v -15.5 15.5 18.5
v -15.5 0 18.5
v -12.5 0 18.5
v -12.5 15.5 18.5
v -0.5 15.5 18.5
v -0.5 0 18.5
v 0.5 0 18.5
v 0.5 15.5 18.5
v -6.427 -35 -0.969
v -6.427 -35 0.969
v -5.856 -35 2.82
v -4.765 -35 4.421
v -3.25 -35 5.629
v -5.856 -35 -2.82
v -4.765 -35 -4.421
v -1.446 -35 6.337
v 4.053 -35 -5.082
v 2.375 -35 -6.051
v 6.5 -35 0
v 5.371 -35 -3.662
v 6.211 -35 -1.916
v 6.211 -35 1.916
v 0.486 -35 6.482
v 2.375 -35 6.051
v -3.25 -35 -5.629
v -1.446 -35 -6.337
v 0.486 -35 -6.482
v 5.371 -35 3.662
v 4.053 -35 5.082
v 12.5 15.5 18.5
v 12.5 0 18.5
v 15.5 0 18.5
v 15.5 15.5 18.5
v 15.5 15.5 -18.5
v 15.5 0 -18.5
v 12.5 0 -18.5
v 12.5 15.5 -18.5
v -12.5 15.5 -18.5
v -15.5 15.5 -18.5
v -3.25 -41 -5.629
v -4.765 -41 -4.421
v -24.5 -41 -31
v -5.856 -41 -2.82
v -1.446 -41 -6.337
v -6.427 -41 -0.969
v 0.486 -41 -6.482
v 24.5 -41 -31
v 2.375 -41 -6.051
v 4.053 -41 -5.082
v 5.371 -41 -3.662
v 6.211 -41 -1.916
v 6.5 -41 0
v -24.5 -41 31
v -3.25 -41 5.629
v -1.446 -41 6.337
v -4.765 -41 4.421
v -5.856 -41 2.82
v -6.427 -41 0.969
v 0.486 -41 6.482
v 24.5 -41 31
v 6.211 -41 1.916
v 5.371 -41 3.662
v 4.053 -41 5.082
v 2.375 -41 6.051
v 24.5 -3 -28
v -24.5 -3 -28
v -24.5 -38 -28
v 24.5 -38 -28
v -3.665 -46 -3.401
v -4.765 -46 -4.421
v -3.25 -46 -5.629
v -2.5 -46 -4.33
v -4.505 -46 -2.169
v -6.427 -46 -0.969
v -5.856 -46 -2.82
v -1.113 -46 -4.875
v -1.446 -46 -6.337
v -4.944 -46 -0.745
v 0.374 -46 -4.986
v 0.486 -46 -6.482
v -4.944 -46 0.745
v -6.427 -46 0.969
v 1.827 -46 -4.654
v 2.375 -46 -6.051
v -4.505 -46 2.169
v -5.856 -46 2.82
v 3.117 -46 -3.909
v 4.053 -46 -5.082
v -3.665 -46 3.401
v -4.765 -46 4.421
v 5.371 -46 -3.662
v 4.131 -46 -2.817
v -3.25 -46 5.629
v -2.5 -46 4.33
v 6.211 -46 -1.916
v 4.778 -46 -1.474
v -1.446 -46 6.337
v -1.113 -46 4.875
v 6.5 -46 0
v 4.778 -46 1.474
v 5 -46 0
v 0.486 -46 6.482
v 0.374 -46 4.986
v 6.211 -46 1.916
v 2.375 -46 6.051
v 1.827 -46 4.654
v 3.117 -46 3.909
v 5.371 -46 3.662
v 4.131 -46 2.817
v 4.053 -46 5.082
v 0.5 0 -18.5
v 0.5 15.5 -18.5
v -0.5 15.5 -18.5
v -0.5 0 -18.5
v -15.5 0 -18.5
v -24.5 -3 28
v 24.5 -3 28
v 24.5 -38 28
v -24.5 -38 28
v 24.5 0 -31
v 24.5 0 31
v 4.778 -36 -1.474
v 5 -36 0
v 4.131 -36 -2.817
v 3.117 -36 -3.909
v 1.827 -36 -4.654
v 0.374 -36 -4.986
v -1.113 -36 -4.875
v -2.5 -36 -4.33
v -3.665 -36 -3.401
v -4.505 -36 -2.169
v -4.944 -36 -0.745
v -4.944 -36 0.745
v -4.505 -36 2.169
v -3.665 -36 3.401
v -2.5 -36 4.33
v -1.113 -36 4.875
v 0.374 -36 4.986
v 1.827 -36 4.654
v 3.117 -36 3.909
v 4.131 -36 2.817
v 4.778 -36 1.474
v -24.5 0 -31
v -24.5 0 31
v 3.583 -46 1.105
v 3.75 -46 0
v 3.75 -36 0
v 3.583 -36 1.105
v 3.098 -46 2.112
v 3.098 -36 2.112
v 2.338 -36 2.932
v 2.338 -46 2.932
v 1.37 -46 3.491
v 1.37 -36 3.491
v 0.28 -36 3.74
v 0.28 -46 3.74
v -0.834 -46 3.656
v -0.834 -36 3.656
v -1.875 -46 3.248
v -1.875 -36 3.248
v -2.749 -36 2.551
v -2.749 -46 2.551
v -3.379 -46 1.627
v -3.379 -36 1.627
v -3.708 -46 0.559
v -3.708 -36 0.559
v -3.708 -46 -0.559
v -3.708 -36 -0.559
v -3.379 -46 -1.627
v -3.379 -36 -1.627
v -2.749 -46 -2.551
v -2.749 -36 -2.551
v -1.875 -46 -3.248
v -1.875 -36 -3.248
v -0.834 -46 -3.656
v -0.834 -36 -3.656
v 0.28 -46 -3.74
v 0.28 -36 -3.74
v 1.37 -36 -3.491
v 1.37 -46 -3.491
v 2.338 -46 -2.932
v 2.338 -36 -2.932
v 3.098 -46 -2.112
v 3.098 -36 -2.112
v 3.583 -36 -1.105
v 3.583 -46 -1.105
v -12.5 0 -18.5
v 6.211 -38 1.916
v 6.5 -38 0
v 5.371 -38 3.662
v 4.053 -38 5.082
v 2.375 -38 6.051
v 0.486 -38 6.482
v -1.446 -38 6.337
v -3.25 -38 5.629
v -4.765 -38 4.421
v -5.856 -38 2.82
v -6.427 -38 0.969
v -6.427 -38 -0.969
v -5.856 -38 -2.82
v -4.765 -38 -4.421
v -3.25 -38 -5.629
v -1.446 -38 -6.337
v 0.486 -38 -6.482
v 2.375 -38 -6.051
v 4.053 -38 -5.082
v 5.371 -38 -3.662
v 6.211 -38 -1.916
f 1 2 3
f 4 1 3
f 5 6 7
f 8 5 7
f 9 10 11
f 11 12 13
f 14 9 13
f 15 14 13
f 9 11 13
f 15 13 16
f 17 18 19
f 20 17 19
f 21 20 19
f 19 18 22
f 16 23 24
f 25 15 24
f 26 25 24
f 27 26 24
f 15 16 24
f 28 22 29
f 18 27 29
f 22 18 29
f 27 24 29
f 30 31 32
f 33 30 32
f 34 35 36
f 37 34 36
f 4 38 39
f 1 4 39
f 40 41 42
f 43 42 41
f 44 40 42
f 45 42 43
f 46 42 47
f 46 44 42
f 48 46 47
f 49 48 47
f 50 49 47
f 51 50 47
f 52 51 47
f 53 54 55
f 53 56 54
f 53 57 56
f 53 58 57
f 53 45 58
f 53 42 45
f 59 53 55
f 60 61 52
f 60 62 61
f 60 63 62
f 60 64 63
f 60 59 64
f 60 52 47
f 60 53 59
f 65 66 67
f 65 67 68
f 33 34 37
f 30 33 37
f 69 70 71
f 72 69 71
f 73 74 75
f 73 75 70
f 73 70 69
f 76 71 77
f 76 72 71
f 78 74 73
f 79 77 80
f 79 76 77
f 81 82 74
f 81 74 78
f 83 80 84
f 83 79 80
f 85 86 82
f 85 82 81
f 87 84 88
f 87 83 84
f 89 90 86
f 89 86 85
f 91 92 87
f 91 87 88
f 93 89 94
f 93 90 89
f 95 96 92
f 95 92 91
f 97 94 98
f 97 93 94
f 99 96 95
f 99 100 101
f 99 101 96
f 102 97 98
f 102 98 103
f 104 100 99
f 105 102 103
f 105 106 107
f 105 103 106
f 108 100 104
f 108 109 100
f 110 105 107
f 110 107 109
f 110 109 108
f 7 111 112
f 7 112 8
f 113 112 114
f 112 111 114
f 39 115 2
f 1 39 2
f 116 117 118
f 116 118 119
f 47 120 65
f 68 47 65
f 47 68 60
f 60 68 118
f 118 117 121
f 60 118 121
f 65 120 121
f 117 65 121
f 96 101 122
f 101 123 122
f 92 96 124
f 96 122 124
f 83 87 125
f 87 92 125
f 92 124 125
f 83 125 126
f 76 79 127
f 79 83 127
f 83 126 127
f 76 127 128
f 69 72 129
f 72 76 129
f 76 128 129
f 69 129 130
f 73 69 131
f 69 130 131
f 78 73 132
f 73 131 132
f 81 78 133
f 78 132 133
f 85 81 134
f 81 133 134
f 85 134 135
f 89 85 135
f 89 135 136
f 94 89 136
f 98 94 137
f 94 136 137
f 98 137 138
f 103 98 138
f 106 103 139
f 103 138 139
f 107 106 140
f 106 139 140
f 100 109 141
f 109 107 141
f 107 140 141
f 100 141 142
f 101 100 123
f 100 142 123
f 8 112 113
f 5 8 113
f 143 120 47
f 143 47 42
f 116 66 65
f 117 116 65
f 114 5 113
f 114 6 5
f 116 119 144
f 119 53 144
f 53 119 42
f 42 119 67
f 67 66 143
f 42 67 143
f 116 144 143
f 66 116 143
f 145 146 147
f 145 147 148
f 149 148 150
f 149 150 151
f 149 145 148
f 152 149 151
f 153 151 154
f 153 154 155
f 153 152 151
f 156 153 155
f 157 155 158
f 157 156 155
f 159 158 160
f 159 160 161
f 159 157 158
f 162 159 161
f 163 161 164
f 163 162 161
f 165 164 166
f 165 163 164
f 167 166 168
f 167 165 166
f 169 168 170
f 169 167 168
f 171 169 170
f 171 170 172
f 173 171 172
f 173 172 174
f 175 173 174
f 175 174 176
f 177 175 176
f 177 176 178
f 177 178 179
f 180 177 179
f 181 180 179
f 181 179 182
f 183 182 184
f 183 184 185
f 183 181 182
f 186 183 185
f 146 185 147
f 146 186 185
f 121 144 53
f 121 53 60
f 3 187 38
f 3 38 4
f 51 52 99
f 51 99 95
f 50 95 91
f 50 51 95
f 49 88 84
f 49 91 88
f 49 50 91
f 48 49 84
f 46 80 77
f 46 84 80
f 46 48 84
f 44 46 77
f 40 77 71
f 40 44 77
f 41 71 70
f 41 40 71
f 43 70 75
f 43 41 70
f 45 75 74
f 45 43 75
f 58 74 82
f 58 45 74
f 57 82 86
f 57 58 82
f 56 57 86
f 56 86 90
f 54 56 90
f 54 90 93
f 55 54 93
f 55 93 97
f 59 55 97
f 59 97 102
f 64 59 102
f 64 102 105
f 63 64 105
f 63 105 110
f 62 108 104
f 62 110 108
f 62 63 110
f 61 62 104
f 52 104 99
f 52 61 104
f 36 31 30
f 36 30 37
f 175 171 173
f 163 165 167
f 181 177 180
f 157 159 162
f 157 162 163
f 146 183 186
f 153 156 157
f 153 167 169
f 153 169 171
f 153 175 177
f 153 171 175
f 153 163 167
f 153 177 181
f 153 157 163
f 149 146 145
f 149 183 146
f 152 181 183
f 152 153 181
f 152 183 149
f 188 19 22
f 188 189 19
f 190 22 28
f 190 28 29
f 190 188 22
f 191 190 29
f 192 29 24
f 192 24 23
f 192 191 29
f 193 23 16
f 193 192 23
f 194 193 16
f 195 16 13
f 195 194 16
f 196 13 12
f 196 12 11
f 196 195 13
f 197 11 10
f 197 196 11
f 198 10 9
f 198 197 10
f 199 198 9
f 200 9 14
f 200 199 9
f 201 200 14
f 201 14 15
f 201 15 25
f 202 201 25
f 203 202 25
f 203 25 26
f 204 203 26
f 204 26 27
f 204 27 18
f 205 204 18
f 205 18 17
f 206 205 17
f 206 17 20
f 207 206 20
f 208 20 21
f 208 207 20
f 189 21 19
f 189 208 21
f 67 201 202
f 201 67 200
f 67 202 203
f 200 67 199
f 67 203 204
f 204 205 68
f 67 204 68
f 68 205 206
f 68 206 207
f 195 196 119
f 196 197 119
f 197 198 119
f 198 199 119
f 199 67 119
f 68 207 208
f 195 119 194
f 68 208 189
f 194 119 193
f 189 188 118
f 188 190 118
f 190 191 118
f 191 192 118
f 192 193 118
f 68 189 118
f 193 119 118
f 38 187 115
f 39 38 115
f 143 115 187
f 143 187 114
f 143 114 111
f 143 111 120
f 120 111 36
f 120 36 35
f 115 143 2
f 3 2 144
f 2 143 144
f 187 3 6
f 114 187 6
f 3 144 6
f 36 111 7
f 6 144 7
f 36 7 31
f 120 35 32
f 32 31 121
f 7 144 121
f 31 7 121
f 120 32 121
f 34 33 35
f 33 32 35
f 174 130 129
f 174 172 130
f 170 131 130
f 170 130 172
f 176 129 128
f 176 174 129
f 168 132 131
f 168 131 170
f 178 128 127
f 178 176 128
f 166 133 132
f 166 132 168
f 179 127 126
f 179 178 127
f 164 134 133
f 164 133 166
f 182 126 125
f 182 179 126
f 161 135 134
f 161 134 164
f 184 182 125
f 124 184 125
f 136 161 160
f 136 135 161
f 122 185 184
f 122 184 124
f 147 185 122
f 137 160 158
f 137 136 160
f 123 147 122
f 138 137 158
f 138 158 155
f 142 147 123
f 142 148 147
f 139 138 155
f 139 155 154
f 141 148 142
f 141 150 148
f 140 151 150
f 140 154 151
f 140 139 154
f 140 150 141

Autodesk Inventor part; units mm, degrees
ref_plane "YZ Plane" through (0, 0, 0) normal (1, 0, 0) x (0, 1, 0)
ref_plane "XZ Plane" through (0, 0, 0) normal (0, 1, 0) x (-1, 0, 0)
ref_plane "XY Plane" through (0, 0, 0) normal (0, 0, 1) x (1, 0, 0)
sketch "Sketch1" plane through (0, 0, 0) normal (0, 1, 0) x (-1, 0, 0)
  line L0 (-0.5, 18.5) -> (-12.5, 18.5)
  line L1 (-12.5, 18.5) -> (-12.5, -18.5)
  line L2 (-12.5, -18.5) -> (-0.5, -18.5)
  line L3 (-0.5, -18.5) -> (-0.5, 18.5)
  line L4 (12.5, 18.5) -> (0.5, 18.5)
  line L5 (0.5, 18.5) -> (0.5, -18.5)
  line L6 (0.5, -18.5) -> (12.5, -18.5)
  line L7 (12.5, -18.5) -> (12.5, 18.5)
  line L8 (15.5, 18.5) -> (-15.5, 18.5)
  line L9 (-15.5, 18.5) -> (-15.5, -18.5)
  line L10 (-15.5, -18.5) -> (15.5, -18.5)
  line L11 (15.5, -18.5) -> (15.5, 18.5)
  point P0 (0, 0)
  point P1 (-12.5, -18.5)
  point P2 (-12.5, 18.5)
  point P3 (-0.5, -18.5)
  point P4 (0.5, -18.5)
  point P5 (0.5, 18.5)
  point P6 (-0.5, 18.5)
  point P7 (12.5, 18.5)
  point P8 (12.5, -18.5)
  dimension "d0" = 12
  dimension "d1" = 12
  dimension "d2" = 1
  dimension "d3" = 37
  dimension "d4" = 37
  dimension "d5" = 0
  dimension "d6" = 0.5
  dimension "d7" = 18.5
  dimension "d8" = 3
  dimension "d9" = 3
  dimension "d10" = 0
  dimension "d11" = 0
extrude "Extrusion1" add sketch "Sketch1" along normal blind 15.5 contours L8 L5 L10 L3 | L1 L10 L9 L8 | L8 L11 L10 L7
sketch "Sketch2" plane through (0, 0, 0) normal (0, -1, 0) x (1, 0, 0)
  line L0 (24.5, 28) -> (-24.5, 28)
  line L1 (-24.5, 28) -> (-24.5, -28)
  line L2 (-24.5, -28) -> (24.5, -28)
  line L3 (24.5, -28) -> (24.5, 28)
  line L4 (15.5, 18.5) -> (15.5, -18.5) projected
  line L5 (-15.5, -18.5) -> (-15.5, 18.5) projected
  line L6 (24.5, 28) -> (-24.5, 28)
  line L7 (-24.5, 28) -> (-24.5, 31)
  line L8 (-24.5, 31) -> (24.5, 31)
  line L9 (24.5, 31) -> (24.5, 28)
  line L10 (-24.5, -28) -> (24.5, -28)
  line L11 (24.5, -28) -> (24.5, -31)
  line L12 (24.5, -31) -> (-24.5, -31)
  line L13 (-24.5, -31) -> (-24.5, -28)
  point P0 (0, 0)
  point P1 (24.5, -28)
  point P2 (-24.5, 28)
  dimension "d14" = 56
  dimension "d15" = 28
  dimension "d16" = 9
  dimension "d17" = 9
  dimension "d18" = 3
  dimension "d19" = 3
extrude "Extrusion2" add sketch "Sketch2" along normal blind 3
sketch "Sketch3" plane through (0, -3, 0) normal (0, -1, 0) x (1, 0, 0)
  line L0 (24.5, 28) -> (-24.5, 28)
  line L1 (-24.5, 28) -> (-24.5, -28)
  line L2 (-24.5, -28) -> (24.5, -28)
  line L3 (24.5, -28) -> (24.5, 28)
  line L4 (24.5, 28) -> (-24.5, 28)
  line L5 (-24.5, 28) -> (-24.5, 31)
  line L6 (-24.5, 31) -> (24.5, 31)
  line L7 (24.5, 31) -> (24.5, 28)
  line L8 (-24.5, -28) -> (24.5, -28)
  line L9 (24.5, -28) -> (24.5, -31)
  line L10 (24.5, -31) -> (-24.5, -31)
  line L11 (-24.5, -31) -> (-24.5, -28)
  point P0 (0, 0)
  point P1 (24.5, -28)
  point P2 (-24.5, 28)
  point P3 (-24.5, 28)
  point P4 (24.5, -28)
  dimension "d22" = 56
  dimension "d23" = 28
  dimension "d26" = 3
  dimension "d27" = 3
extrude "Extrusion3" add sketch "Sketch3" along normal blind 35 contours L0 L5 L6 L7 | L9 L10 L11 L2
sketch "Sketch4" plane through (0, -38, 0) normal (0, -1, 0) x (1, 0, 0)
  line L0 (24.5, 28) -> (-24.5, 28)
  line L1 (-24.5, 28) -> (-24.5, -28)
  line L2 (-24.5, -28) -> (24.5, -28)
  line L3 (24.5, -28) -> (24.5, 28)
  line L4 (24.5, 28) -> (-24.5, 28)
  line L5 (-24.5, 28) -> (-24.5, 31)
  line L6 (-24.5, 31) -> (24.5, 31)
  line L7 (24.5, 31) -> (24.5, 28)
  line L8 (-24.5, -28) -> (24.5, -28)
  line L9 (24.5, -28) -> (24.5, -31)
  line L10 (24.5, -31) -> (-24.5, -31)
  line L11 (-24.5, -31) -> (-24.5, -28)
  point P0 (0, 0)
  point P1 (24.5, -28)
  point P2 (-24.5, 28)
  dimension "d30" = 56
  dimension "d31" = 28
  dimension "d34" = 3
  dimension "d35" = 3
extrude "Extrusion4" add sketch "Sketch4" along normal blind 3
sketch "Sketch7" plane through (0, -41, 0) normal (0, -1, 0) x (1, 0, 0)
  circle A0 centre (0, 0) radius 6.5
  dimension "d45" = 13
extrude "Extrusion7" add sketch "Sketch7" against normal blind 6
sketch "Sketch8" plane through (0, -41, 0) normal (0, -1, 0) x (1, 0, 0)
  circle A0 centre (0, 0) radius 3.75
  circle A1 centre (0, 0) radius 5
  dimension "d48" = 7.5
  dimension "d49" = 10
extrude "Extrusion8" cut sketch "Sketch8" against normal blind 5
sketch "Sketch9" plane through (0, -41, 0) normal (0, -1, 0) x (1, 0, 0)
  circle A0 centre (0, 0) radius 3.75
  circle A1 centre (0, 0) radius 5
  circle A2 centre (0, 0) radius 6.5
  dimension "d52" = 13
  dimension "d53" = 10
  dimension "d54" = 7.5
extrude "Extrusion9" add sketch "Sketch9" along normal blind 5
properties part number "Koszyk"
